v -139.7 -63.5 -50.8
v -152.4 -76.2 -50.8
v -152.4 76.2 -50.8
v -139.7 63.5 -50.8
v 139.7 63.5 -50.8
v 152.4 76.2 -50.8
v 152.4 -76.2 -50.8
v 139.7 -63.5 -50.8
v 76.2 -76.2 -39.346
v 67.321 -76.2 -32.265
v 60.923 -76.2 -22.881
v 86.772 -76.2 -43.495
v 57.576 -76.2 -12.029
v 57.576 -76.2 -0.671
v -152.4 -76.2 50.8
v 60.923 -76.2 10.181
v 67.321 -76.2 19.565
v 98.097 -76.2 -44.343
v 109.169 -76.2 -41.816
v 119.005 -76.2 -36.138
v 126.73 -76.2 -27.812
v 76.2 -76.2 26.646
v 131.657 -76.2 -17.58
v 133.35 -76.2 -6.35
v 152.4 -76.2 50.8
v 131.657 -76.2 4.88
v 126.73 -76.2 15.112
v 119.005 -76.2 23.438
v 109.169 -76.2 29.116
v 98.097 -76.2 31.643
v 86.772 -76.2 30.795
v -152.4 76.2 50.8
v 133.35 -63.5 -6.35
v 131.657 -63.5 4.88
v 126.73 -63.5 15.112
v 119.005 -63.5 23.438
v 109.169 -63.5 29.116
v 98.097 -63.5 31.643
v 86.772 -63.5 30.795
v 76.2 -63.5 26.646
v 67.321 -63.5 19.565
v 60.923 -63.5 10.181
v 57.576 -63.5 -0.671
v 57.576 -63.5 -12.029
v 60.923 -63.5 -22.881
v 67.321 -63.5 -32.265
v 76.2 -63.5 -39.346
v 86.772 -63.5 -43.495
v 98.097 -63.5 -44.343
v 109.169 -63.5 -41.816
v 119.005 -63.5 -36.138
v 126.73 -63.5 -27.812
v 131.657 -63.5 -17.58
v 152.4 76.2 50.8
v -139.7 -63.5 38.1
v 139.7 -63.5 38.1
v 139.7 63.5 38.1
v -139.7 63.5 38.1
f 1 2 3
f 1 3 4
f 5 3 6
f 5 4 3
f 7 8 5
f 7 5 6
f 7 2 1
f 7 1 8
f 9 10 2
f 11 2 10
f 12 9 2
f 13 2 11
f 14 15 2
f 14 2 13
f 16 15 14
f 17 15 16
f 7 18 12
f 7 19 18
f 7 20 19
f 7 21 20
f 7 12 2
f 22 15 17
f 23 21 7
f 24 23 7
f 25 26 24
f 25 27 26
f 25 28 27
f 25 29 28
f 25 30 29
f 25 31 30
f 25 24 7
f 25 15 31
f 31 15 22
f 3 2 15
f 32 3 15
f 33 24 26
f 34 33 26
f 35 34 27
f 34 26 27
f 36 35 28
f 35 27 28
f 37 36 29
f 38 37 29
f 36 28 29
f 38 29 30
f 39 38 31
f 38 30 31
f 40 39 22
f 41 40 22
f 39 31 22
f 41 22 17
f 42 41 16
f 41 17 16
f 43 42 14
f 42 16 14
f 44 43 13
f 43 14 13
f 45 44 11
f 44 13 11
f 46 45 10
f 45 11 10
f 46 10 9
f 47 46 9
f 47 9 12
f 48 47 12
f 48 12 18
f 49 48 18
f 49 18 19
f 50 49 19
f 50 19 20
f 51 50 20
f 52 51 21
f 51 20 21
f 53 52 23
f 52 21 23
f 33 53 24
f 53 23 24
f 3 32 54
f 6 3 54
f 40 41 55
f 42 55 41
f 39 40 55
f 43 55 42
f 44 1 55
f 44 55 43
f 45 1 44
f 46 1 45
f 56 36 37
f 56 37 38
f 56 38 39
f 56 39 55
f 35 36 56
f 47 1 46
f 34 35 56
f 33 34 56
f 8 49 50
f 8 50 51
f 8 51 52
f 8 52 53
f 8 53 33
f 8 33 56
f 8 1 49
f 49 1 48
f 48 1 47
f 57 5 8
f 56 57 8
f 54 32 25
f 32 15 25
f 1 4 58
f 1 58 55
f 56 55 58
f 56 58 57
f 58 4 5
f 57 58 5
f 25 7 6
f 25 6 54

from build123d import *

# Parameters (mm, degrees)
F0_W     = 304.8
F0_H     = 101.6
F1_DEPTH = 76.2
F2_W     = 279.4
F2_H     = 127
F3_DEPTH = 88.9
F4_R     = 38.1
F5_DEPTH = 12.7


with BuildPart() as f1:
    # F0 (on Front) → F1 (new body, symmetric)
    with BuildSketch(Plane.XZ):
        Rectangle(F0_W, F0_H)
    extrude(amount=F1_DEPTH, both=True)

    # F2 (on face) → F3 (cut)
    with BuildSketch(Plane(origin=(0, 0, -50.8), x_dir=(1, 0, 0), z_dir=(0, 0, -1))):
        Rectangle(F2_W, F2_H)
    extrude(amount=-F3_DEPTH, mode=Mode.SUBTRACT)

    # F4 (on face) → F5 (cut)
    with BuildSketch(Plane.XZ.offset(76.2)):
        with Locations((95.25, -6.35)):
            Circle(F4_R)
    extrude(amount=-F5_DEPTH, mode=Mode.SUBTRACT)


solid = f1.part
